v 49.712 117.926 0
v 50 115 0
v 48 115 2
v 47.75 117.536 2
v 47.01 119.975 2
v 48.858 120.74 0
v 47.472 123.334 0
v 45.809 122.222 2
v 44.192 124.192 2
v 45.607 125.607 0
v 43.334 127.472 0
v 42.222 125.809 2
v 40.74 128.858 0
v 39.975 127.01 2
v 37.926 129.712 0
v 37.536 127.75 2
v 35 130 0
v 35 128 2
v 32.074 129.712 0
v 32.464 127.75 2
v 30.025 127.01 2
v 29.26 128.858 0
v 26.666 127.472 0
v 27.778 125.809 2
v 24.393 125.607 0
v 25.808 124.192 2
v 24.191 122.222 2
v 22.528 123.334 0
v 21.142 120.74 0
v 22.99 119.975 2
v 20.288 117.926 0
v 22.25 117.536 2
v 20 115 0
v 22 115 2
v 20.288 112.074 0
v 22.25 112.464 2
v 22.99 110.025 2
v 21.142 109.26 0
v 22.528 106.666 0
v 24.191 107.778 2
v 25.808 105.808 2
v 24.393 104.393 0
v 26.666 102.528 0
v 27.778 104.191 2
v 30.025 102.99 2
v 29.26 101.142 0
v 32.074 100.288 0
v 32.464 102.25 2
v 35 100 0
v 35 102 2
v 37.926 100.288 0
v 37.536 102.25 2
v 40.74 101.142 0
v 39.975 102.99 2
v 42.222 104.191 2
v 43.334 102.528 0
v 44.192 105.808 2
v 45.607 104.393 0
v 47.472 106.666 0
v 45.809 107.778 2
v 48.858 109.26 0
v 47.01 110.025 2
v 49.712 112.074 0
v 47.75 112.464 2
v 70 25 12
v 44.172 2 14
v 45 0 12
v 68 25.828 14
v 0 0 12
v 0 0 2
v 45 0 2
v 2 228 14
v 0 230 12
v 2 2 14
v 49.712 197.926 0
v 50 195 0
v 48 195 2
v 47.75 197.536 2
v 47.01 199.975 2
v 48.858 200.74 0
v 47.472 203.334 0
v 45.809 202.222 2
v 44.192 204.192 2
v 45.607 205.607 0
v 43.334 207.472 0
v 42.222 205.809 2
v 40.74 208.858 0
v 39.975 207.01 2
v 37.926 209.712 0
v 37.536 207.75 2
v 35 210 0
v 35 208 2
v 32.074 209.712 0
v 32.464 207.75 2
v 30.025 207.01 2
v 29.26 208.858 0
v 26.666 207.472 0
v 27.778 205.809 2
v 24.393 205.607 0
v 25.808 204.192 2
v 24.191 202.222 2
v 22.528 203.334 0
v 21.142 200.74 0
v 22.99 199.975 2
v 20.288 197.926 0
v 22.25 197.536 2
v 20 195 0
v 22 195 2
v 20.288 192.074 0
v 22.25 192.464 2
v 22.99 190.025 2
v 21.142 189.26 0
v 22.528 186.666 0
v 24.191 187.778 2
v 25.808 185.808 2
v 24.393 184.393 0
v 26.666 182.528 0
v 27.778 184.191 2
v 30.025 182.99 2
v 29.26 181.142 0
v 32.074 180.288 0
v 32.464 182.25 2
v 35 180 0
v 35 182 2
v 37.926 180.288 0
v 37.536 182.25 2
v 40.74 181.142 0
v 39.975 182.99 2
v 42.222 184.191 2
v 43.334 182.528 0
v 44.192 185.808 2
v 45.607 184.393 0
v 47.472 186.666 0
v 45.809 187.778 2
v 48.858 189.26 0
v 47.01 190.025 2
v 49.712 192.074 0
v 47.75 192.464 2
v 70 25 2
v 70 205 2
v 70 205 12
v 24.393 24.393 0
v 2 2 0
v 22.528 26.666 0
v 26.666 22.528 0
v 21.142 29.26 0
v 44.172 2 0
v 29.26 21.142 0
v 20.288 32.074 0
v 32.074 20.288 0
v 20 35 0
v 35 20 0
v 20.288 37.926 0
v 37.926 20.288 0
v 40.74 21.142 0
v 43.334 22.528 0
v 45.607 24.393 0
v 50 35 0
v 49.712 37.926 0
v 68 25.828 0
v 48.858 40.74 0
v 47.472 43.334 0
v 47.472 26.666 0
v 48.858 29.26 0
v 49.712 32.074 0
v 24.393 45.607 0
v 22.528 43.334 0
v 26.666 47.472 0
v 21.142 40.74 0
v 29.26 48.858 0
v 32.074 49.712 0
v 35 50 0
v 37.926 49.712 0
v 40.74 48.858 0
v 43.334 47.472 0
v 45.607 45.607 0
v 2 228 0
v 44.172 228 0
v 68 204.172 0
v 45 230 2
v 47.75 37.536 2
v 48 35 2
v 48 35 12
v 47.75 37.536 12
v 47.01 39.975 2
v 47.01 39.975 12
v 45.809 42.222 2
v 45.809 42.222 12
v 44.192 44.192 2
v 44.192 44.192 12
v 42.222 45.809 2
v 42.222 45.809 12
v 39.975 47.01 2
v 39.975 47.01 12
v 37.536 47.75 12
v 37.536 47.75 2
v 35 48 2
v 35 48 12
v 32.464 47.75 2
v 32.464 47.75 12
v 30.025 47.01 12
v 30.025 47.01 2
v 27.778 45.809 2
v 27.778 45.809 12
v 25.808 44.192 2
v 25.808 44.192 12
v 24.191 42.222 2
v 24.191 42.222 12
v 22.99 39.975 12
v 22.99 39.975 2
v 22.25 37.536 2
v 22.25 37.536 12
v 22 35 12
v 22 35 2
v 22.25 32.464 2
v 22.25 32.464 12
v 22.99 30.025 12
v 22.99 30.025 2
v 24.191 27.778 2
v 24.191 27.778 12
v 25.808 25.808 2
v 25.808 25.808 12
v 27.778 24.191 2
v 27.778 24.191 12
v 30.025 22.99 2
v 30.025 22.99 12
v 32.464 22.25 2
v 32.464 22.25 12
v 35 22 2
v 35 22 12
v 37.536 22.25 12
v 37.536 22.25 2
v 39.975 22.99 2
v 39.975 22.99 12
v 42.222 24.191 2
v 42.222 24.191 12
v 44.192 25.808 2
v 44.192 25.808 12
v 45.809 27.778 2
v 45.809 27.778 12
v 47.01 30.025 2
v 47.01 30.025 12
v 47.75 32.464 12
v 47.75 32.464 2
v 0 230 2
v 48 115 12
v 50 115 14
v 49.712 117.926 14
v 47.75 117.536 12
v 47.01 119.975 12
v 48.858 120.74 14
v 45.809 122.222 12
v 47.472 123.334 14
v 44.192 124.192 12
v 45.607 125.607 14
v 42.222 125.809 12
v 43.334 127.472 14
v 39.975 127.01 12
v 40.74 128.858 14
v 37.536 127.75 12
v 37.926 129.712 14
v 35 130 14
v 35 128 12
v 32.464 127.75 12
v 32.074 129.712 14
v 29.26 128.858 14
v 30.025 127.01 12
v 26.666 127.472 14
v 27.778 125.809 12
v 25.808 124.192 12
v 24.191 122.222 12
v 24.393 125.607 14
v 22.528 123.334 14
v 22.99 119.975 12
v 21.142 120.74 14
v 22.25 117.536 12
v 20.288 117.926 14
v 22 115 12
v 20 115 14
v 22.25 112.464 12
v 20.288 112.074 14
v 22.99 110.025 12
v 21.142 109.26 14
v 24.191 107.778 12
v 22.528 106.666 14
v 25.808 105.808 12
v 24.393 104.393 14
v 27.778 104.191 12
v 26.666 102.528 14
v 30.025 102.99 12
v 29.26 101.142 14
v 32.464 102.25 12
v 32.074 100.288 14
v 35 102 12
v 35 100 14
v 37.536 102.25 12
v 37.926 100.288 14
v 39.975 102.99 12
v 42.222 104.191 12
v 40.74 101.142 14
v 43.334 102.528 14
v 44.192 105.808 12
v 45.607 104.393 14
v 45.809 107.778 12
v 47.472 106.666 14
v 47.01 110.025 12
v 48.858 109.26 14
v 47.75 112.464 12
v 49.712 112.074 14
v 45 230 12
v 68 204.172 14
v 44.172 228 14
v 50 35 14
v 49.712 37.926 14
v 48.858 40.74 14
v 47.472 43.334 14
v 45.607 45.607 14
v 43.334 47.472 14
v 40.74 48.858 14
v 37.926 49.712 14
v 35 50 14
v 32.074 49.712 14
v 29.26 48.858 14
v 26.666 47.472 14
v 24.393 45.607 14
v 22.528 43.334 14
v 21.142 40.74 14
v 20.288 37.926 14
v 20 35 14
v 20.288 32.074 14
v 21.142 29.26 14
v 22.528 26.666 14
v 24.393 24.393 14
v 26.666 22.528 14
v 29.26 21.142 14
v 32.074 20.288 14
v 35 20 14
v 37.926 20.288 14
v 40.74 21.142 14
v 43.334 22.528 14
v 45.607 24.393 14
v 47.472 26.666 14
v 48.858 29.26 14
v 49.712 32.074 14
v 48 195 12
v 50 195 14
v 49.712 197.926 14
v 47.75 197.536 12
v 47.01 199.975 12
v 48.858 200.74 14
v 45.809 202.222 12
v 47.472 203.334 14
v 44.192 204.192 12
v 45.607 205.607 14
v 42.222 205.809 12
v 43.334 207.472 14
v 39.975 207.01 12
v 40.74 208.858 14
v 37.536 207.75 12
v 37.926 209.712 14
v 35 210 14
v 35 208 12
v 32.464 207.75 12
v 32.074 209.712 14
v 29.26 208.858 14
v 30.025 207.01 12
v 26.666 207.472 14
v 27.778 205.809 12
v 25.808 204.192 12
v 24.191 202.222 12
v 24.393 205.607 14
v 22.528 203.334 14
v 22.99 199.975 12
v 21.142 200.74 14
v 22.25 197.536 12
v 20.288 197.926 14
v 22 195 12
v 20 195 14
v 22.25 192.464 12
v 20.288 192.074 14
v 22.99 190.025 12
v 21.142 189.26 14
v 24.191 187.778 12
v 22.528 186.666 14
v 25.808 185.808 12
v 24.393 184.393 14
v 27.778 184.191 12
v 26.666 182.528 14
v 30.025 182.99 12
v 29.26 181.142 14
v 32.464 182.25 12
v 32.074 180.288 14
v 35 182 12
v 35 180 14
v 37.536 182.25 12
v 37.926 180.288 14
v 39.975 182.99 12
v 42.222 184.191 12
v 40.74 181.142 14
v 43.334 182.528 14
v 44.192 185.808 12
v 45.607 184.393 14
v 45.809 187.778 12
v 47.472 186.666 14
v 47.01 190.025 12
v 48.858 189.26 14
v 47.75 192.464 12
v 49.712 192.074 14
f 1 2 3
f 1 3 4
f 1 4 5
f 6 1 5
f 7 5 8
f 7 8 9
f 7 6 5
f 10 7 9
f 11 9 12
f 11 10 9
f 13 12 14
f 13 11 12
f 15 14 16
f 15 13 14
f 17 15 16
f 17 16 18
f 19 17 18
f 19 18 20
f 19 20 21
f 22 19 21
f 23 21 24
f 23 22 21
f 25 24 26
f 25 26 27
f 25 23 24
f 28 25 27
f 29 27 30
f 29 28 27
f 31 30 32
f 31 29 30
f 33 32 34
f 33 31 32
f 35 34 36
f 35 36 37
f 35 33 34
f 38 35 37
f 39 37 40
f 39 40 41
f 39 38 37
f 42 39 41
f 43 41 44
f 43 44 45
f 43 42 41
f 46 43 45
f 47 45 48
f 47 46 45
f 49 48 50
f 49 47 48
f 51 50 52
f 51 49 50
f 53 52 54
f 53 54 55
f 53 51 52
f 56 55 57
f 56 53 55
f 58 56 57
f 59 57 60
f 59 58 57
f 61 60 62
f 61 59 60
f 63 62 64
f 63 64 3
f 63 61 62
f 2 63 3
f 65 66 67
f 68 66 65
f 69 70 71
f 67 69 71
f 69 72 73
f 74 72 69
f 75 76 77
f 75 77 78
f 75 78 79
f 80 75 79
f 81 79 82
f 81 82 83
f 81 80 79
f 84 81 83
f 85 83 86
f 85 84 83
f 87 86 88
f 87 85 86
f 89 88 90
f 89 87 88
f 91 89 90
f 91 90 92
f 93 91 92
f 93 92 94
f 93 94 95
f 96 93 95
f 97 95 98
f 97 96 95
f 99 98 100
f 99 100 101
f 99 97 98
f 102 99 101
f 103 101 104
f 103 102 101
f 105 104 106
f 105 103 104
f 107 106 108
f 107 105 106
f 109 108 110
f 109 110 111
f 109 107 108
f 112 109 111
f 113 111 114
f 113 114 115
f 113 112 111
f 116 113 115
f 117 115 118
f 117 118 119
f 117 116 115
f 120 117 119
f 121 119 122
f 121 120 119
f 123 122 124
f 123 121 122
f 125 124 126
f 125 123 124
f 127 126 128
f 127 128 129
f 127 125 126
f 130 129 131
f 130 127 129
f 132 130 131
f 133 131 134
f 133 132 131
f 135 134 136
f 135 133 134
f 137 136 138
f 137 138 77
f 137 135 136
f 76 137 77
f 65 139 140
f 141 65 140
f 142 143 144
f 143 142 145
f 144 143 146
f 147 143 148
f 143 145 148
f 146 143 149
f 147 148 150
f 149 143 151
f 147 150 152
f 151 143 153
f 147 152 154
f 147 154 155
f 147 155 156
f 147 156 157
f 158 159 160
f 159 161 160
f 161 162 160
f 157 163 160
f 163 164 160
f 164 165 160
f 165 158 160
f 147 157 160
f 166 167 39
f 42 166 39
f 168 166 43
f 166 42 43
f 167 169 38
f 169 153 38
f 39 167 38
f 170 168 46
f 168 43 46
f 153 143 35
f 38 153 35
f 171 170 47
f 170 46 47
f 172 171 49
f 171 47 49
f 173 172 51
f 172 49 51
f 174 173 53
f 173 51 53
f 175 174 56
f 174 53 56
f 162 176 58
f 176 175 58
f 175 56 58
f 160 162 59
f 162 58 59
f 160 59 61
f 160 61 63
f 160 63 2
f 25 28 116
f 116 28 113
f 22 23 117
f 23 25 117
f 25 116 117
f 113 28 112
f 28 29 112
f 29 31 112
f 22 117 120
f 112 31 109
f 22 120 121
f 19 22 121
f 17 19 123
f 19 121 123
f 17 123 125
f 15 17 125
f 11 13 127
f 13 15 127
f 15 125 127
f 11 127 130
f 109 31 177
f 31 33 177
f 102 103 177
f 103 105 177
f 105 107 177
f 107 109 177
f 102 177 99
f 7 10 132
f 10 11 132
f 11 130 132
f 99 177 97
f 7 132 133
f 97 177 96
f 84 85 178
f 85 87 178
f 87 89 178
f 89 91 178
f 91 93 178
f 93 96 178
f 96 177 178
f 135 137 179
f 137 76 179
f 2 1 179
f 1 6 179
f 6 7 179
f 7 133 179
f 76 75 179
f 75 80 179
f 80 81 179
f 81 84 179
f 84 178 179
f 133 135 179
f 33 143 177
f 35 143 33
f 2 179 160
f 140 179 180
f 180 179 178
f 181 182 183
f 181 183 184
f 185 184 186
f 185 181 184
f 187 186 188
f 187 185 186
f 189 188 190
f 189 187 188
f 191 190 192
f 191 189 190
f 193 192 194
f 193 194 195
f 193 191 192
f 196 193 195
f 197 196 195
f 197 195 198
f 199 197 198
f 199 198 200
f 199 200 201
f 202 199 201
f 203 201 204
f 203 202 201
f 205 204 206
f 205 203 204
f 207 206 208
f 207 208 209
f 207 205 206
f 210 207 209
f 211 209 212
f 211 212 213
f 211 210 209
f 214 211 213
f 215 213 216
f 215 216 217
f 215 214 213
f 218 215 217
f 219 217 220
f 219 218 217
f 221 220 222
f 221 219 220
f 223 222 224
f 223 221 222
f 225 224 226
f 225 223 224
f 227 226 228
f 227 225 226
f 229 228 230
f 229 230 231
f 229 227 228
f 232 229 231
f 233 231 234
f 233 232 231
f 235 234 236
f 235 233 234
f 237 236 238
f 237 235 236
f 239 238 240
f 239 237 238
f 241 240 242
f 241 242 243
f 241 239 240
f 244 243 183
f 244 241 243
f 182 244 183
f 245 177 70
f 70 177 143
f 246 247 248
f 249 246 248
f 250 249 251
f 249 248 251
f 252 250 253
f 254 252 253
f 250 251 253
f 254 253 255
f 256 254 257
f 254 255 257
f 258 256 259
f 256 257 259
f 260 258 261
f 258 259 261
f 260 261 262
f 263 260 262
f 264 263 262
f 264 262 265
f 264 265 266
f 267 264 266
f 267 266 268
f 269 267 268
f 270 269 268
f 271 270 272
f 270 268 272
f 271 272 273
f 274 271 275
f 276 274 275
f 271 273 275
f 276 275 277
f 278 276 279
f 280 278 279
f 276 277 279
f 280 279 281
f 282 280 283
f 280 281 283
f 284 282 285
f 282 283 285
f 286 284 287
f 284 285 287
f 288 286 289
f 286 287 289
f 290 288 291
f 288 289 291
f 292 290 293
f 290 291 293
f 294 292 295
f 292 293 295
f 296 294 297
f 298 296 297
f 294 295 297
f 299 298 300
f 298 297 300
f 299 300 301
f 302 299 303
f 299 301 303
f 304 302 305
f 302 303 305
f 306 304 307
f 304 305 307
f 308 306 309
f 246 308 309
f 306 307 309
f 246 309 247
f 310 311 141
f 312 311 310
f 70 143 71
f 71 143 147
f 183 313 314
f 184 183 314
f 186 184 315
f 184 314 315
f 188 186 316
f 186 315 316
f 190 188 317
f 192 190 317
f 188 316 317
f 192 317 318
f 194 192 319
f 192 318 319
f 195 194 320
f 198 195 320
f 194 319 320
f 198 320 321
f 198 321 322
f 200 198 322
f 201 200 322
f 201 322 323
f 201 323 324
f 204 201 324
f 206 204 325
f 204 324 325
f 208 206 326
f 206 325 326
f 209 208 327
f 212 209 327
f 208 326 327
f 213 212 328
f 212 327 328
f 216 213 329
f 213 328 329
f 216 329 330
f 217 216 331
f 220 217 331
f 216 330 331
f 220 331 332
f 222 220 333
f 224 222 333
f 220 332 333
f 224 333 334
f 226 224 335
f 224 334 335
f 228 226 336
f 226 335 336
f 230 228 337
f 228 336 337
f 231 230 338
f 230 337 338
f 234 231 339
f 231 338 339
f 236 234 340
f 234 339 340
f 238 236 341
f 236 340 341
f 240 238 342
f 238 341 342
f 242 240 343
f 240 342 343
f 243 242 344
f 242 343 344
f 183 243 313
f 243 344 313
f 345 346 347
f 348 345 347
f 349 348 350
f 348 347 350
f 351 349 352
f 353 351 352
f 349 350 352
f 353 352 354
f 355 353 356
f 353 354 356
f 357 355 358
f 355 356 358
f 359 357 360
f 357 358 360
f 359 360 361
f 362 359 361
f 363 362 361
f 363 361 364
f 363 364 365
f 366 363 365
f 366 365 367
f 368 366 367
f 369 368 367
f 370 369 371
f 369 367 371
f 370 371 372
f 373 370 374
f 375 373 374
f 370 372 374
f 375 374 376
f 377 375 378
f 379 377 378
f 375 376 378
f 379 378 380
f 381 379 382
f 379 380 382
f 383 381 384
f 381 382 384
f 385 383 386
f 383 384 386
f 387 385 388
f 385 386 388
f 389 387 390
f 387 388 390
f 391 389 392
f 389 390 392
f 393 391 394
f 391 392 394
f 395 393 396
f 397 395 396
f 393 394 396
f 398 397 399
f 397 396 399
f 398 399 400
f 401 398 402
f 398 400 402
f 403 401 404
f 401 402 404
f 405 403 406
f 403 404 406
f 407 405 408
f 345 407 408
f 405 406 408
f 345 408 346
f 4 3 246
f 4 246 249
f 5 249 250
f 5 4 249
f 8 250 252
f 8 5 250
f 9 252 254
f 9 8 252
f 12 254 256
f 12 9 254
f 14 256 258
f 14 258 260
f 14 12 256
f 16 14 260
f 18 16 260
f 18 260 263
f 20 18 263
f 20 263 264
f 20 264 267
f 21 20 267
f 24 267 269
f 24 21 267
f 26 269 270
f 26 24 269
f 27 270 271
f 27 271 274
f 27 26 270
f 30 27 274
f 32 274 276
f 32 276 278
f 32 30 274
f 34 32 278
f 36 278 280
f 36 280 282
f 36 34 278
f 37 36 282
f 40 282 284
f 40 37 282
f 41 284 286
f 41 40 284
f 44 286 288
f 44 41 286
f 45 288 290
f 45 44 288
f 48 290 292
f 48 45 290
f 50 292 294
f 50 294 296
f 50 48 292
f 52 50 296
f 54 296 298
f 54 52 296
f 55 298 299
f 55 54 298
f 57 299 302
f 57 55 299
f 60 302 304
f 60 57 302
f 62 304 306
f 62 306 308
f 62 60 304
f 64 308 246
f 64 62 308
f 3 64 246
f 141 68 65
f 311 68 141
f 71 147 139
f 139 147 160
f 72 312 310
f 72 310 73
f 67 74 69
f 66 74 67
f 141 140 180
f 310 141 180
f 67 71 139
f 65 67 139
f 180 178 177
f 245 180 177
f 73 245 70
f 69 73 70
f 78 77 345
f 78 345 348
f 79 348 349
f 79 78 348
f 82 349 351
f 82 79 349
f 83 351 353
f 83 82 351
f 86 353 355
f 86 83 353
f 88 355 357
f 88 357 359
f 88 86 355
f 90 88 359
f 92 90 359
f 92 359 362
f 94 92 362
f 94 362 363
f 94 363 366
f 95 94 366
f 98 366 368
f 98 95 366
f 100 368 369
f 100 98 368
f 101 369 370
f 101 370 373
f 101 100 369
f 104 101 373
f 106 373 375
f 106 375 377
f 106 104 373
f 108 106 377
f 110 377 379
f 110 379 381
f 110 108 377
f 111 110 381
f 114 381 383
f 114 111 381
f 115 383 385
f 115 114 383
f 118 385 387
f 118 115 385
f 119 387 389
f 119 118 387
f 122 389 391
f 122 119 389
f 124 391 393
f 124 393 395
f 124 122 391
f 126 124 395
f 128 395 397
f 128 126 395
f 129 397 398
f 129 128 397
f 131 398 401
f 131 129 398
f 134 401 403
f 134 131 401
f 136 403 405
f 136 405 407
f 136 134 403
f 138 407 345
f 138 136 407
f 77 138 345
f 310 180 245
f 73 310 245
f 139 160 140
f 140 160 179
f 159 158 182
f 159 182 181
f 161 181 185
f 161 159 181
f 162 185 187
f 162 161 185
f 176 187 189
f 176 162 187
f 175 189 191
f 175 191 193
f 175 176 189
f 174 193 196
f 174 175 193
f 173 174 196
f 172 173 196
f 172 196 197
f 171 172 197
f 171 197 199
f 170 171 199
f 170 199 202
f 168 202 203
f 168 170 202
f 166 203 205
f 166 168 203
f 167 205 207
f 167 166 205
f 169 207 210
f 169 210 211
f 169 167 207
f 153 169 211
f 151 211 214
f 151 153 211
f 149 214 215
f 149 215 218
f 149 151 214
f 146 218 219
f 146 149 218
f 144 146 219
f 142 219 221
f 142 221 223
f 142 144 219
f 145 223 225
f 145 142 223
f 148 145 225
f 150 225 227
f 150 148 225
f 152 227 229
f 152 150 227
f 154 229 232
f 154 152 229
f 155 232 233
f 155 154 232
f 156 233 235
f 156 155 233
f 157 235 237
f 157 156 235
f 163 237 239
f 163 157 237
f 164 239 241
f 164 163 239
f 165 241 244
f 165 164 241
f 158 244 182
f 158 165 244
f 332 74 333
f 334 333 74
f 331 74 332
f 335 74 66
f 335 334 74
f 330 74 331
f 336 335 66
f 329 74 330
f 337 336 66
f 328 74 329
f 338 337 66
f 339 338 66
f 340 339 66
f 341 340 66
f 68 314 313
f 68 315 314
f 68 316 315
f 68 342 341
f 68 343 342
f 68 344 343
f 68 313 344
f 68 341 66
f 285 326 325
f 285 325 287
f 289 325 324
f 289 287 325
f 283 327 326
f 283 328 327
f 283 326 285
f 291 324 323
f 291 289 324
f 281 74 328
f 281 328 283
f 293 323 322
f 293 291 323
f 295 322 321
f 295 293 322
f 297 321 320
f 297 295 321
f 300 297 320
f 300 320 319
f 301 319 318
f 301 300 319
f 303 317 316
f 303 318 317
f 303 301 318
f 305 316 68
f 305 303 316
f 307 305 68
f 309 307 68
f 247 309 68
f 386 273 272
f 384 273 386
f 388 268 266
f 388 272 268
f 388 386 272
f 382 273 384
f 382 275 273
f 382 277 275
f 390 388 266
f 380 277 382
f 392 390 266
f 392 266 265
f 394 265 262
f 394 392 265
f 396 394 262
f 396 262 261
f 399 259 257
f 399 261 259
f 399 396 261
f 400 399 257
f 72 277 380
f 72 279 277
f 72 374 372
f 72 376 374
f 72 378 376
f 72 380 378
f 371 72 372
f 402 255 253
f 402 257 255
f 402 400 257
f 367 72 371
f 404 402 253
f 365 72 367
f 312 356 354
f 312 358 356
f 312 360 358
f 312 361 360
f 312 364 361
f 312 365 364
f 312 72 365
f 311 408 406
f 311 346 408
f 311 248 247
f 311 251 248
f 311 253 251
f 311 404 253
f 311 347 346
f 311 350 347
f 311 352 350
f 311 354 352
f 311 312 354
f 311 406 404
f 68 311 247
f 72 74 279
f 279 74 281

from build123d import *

# Parameters (mm, degrees)
SKETCH_1_R        = 13
EXTRUDE_477_DEPTH = 14
CHAMFER_1_SIZE    = 2


with BuildPart() as part:
    # 草图1 → Extrude 477 (new body)
    with BuildSketch(Plane.XY):
        Polygon((0, 0), (45, 0), (70, 25), (70, 205), (45, 230), (0, 230), align=None)
        with Locations((35, 35)):
            Circle(SKETCH_1_R, mode=Mode.SUBTRACT)
        with Locations((35, 115)):
            Circle(SKETCH_1_R, mode=Mode.SUBTRACT)
        with Locations((35, 195)):
            Circle(SKETCH_1_R, mode=Mode.SUBTRACT)
    extrude(amount=EXTRUDE_477_DEPTH)

    # 倒角1
    chamfer_1_edges = [part.edges().sort_by_distance(p)[0] for p in [
        (57.5, 12.5, 14),
        (70, 115, 14),
        (57.5, 217.5, 14),
        (22, 35, 0),
        (22, 35, 14),
        (22.5, 230, 14),
        (22, 115, 0),
        (22, 115, 14),
        (22, 195, 0),
        (22, 195, 14),
        (0, 115, 14),
        (22.5, 230, 0),
        (57.5, 217.5, 0),
        (70, 115, 0),
        (22.5, 0, 14),
        (57.5, 12.5, 0),
        (22.5, 0, 0),
        (0, 115, 0),
    ]]
    chamfer(chamfer_1_edges, length=CHAMFER_1_SIZE)


solid = part.part
